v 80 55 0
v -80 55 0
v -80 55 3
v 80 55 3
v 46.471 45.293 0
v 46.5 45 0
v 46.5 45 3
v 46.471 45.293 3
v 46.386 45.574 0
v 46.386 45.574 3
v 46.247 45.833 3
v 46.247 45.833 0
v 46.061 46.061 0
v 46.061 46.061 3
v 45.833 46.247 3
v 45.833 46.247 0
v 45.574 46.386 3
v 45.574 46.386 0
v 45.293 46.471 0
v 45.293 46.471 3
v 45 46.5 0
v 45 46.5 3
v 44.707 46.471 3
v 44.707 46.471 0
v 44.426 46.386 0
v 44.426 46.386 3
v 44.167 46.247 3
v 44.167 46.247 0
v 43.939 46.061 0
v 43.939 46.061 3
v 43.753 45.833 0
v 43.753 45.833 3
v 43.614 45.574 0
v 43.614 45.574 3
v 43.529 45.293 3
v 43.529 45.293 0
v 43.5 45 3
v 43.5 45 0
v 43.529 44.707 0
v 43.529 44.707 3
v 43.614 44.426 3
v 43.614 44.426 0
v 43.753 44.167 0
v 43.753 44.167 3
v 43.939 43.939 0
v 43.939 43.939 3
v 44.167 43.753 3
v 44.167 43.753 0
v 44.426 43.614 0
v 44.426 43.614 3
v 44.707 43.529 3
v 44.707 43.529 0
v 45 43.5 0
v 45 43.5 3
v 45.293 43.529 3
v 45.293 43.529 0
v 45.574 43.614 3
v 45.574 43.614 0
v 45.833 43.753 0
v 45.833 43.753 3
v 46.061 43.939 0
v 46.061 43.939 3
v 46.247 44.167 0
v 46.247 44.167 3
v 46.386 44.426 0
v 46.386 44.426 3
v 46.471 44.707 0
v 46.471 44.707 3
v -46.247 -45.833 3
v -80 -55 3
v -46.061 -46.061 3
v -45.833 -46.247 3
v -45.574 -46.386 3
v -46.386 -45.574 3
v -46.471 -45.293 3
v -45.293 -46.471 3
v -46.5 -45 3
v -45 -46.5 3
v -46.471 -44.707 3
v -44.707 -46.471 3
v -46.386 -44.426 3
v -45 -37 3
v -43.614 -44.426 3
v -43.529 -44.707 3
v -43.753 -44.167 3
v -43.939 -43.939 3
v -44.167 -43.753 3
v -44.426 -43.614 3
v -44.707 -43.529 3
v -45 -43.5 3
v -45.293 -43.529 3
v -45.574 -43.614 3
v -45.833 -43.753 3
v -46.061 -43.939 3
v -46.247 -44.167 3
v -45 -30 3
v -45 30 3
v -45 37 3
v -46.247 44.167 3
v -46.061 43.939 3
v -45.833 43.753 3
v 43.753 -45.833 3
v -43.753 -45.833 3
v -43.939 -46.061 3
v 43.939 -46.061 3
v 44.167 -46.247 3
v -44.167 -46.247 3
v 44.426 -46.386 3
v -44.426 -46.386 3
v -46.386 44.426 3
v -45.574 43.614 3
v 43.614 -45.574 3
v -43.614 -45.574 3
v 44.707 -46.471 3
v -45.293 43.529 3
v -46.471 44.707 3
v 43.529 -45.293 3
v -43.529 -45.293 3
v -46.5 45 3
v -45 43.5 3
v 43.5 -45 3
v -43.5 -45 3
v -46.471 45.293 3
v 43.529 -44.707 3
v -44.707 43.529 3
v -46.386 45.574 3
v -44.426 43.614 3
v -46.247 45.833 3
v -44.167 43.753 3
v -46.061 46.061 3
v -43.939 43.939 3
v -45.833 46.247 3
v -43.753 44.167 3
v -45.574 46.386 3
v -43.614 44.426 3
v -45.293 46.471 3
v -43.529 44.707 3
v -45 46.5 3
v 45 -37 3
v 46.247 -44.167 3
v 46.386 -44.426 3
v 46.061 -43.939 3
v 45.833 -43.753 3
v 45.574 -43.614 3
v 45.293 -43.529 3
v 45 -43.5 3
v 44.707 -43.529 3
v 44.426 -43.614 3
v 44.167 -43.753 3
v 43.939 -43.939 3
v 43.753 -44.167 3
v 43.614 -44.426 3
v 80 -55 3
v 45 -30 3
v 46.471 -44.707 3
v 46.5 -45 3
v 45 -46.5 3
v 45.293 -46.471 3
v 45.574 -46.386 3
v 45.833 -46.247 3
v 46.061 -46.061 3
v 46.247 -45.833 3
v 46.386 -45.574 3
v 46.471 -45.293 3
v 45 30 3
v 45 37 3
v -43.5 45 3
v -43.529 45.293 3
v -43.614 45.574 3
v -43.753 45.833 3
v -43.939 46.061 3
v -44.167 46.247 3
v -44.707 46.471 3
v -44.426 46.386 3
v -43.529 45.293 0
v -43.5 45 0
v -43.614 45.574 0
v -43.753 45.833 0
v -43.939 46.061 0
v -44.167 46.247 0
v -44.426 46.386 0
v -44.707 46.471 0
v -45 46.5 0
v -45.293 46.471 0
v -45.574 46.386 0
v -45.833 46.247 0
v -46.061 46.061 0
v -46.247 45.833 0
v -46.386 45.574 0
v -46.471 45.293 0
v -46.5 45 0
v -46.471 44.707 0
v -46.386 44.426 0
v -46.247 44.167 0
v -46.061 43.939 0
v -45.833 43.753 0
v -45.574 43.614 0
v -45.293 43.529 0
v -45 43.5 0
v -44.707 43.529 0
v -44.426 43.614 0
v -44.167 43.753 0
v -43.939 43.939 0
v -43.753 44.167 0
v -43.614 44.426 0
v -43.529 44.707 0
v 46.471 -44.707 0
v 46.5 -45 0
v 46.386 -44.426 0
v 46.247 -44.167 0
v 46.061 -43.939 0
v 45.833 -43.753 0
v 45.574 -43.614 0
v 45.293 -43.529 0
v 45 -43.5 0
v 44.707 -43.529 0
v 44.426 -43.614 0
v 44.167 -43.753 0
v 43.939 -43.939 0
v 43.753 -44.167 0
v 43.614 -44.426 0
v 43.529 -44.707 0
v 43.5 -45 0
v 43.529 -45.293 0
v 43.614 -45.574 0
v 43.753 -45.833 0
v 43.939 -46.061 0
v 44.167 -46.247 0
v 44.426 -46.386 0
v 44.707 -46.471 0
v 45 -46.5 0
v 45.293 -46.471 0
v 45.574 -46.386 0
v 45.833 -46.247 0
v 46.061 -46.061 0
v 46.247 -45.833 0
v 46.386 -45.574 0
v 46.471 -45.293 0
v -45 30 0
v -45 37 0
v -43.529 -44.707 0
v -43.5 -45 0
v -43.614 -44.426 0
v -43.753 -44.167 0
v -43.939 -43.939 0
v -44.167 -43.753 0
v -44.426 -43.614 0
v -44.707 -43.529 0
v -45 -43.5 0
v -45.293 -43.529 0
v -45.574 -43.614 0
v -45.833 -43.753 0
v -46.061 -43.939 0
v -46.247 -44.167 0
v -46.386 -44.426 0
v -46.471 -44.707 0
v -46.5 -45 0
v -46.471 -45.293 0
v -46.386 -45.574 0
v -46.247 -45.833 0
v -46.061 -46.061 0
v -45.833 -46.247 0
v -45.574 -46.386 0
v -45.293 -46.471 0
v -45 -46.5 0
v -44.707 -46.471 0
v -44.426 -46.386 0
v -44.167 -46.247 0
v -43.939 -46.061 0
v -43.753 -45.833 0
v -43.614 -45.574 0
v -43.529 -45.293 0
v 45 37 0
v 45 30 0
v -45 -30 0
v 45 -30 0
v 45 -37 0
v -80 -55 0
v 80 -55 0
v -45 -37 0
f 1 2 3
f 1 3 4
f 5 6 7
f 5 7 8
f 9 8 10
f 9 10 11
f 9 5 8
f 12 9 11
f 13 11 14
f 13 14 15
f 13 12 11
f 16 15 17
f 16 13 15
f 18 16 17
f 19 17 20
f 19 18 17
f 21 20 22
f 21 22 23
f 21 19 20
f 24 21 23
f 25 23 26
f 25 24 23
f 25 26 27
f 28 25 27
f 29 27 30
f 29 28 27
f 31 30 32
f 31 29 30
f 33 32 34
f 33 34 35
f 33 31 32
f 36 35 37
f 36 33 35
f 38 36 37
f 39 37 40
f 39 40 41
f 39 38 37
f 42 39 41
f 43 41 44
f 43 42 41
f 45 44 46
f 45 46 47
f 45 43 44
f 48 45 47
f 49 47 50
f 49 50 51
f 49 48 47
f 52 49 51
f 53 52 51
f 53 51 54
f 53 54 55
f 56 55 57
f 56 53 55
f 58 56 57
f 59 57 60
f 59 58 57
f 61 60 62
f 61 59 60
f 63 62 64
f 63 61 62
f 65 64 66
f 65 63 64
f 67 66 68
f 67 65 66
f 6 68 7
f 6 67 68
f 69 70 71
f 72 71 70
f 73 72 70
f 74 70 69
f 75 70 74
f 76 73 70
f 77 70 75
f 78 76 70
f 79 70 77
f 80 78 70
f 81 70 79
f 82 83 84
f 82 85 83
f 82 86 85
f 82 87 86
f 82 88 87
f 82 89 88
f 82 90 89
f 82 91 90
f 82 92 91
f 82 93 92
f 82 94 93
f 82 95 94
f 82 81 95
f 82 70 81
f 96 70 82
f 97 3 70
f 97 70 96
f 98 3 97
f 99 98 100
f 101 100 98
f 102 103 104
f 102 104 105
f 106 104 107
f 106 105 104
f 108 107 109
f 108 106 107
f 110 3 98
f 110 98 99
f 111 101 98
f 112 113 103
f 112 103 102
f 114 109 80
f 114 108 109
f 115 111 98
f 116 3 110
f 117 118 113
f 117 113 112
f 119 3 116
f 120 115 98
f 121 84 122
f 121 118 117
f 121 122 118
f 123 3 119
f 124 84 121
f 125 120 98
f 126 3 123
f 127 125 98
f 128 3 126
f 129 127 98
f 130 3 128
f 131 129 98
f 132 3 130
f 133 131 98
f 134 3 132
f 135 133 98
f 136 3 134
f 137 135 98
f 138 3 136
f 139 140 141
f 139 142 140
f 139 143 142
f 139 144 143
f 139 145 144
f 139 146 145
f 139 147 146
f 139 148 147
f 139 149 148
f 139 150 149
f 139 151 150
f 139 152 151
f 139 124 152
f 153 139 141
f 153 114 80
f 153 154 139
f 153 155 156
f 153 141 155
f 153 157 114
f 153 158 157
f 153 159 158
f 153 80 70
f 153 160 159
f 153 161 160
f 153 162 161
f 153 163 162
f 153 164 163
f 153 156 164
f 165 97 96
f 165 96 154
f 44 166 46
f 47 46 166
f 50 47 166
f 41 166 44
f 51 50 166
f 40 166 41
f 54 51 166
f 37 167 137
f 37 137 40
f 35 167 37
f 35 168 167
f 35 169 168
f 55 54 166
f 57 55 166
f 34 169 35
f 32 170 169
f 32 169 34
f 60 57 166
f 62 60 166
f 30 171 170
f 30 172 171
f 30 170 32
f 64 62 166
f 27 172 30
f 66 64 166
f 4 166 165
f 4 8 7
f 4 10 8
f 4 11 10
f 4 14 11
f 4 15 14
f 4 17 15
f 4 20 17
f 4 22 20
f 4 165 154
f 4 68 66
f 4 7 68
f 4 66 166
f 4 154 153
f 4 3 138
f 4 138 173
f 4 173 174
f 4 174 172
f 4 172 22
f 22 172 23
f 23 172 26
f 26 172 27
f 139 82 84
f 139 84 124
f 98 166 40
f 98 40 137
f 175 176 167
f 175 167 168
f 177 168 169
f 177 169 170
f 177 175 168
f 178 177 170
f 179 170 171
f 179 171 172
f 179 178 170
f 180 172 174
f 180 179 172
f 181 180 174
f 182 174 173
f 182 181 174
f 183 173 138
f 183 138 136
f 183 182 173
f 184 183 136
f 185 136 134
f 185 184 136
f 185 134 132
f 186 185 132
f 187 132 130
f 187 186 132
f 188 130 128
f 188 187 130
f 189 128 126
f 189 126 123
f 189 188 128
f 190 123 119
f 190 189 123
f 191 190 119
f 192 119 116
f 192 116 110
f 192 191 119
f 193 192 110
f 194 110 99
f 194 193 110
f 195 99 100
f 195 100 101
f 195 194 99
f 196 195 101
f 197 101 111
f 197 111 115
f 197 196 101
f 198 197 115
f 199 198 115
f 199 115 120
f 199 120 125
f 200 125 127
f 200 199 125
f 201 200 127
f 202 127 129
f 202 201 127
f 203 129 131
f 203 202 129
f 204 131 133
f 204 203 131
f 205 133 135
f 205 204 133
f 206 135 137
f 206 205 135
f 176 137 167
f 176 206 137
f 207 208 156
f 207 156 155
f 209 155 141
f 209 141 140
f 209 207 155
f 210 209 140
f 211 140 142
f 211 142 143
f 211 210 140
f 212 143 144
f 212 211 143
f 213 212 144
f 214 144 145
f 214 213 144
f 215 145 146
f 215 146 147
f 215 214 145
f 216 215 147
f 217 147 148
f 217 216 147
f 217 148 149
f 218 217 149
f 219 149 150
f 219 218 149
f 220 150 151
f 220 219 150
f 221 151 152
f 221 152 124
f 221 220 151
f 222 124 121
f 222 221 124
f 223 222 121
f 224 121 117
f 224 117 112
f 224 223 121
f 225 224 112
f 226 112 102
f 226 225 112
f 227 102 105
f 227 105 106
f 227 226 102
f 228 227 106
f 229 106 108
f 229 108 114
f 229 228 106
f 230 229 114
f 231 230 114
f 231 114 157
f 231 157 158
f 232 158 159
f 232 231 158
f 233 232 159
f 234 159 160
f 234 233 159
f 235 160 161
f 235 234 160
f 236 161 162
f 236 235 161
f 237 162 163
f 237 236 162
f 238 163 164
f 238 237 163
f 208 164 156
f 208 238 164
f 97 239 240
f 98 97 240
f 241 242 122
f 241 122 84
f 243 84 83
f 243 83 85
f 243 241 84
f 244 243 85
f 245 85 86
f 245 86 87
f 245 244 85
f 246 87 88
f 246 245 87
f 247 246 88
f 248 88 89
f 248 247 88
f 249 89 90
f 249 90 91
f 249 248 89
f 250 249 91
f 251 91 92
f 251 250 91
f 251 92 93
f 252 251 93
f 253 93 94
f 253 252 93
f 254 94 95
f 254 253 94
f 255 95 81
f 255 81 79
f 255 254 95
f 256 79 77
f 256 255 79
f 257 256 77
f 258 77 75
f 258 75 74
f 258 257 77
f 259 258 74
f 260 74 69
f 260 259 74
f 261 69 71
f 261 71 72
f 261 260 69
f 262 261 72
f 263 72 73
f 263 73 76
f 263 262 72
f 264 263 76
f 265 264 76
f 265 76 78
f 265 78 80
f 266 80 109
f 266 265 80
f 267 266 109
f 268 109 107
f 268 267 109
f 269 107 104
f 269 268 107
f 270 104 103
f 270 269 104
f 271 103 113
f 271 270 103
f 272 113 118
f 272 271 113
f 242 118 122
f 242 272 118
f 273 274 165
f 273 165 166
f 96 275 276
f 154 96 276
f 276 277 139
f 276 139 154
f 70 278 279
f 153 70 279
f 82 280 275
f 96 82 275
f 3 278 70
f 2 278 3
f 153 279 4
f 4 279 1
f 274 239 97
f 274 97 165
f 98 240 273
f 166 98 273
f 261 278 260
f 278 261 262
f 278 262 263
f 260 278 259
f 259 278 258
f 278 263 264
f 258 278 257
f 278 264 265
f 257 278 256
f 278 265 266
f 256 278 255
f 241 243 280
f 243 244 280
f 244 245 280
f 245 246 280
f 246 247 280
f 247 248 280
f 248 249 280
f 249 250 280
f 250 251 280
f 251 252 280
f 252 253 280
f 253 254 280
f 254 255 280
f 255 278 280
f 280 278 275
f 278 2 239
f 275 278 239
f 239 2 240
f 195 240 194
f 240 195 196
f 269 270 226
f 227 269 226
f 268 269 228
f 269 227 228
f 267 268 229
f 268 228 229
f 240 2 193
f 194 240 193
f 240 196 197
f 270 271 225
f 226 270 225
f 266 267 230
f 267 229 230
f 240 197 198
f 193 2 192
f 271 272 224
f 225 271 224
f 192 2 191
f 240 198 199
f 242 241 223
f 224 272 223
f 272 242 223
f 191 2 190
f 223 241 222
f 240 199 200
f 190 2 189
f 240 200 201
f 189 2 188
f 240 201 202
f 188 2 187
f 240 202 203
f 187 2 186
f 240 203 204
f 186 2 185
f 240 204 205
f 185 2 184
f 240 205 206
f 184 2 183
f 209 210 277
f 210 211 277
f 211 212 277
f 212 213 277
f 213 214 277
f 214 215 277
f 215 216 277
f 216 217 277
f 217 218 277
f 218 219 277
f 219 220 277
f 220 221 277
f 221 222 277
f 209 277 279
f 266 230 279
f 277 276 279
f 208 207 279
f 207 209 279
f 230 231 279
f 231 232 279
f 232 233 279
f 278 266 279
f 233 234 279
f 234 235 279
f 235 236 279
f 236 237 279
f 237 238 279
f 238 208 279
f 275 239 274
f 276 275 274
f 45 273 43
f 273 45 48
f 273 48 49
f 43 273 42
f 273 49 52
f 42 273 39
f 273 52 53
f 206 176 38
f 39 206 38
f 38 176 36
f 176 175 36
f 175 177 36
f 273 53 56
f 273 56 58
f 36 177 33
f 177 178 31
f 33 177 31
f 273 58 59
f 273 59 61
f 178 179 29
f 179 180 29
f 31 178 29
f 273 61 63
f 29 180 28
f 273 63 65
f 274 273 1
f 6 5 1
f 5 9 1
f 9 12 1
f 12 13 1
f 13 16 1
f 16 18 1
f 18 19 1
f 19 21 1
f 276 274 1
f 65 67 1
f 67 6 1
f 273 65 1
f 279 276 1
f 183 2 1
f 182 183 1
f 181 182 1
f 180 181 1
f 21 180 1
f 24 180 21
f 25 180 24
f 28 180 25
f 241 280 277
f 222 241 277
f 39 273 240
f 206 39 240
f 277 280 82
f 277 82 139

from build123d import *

# Parameters (mm, degrees)
SKETCH1_W           = 160
SKETCH1_H           = 110
SKETCH1_R           = 1.5
SKETCH1_W_2         = 90
SKETCH1_H_2         = 7
BOSS_EXTRUDE1_DEPTH = 3


with BuildPart() as part:
    # Sketch1 → Boss-Extrude1 (new body)
    with BuildSketch(Plane.XY):
        Rectangle(SKETCH1_W, SKETCH1_H)
        with Locations((45, 45)):
            Circle(SKETCH1_R, mode=Mode.SUBTRACT)
        with Locations((-45, 45)):
            Circle(SKETCH1_R, mode=Mode.SUBTRACT)
        with Locations((-45, -45)):
            Circle(SKETCH1_R, mode=Mode.SUBTRACT)
        with Locations((45, -45)):
            Circle(SKETCH1_R, mode=Mode.SUBTRACT)
        with Locations((0, 33.5)):
            Rectangle(SKETCH1_W_2, SKETCH1_H_2, mode=Mode.SUBTRACT)
        with Locations((0, -33.5)):
            Rectangle(SKETCH1_W_2, SKETCH1_H_2, mode=Mode.SUBTRACT)
    extrude(amount=BOSS_EXTRUDE1_DEPTH)


solid = part.part
